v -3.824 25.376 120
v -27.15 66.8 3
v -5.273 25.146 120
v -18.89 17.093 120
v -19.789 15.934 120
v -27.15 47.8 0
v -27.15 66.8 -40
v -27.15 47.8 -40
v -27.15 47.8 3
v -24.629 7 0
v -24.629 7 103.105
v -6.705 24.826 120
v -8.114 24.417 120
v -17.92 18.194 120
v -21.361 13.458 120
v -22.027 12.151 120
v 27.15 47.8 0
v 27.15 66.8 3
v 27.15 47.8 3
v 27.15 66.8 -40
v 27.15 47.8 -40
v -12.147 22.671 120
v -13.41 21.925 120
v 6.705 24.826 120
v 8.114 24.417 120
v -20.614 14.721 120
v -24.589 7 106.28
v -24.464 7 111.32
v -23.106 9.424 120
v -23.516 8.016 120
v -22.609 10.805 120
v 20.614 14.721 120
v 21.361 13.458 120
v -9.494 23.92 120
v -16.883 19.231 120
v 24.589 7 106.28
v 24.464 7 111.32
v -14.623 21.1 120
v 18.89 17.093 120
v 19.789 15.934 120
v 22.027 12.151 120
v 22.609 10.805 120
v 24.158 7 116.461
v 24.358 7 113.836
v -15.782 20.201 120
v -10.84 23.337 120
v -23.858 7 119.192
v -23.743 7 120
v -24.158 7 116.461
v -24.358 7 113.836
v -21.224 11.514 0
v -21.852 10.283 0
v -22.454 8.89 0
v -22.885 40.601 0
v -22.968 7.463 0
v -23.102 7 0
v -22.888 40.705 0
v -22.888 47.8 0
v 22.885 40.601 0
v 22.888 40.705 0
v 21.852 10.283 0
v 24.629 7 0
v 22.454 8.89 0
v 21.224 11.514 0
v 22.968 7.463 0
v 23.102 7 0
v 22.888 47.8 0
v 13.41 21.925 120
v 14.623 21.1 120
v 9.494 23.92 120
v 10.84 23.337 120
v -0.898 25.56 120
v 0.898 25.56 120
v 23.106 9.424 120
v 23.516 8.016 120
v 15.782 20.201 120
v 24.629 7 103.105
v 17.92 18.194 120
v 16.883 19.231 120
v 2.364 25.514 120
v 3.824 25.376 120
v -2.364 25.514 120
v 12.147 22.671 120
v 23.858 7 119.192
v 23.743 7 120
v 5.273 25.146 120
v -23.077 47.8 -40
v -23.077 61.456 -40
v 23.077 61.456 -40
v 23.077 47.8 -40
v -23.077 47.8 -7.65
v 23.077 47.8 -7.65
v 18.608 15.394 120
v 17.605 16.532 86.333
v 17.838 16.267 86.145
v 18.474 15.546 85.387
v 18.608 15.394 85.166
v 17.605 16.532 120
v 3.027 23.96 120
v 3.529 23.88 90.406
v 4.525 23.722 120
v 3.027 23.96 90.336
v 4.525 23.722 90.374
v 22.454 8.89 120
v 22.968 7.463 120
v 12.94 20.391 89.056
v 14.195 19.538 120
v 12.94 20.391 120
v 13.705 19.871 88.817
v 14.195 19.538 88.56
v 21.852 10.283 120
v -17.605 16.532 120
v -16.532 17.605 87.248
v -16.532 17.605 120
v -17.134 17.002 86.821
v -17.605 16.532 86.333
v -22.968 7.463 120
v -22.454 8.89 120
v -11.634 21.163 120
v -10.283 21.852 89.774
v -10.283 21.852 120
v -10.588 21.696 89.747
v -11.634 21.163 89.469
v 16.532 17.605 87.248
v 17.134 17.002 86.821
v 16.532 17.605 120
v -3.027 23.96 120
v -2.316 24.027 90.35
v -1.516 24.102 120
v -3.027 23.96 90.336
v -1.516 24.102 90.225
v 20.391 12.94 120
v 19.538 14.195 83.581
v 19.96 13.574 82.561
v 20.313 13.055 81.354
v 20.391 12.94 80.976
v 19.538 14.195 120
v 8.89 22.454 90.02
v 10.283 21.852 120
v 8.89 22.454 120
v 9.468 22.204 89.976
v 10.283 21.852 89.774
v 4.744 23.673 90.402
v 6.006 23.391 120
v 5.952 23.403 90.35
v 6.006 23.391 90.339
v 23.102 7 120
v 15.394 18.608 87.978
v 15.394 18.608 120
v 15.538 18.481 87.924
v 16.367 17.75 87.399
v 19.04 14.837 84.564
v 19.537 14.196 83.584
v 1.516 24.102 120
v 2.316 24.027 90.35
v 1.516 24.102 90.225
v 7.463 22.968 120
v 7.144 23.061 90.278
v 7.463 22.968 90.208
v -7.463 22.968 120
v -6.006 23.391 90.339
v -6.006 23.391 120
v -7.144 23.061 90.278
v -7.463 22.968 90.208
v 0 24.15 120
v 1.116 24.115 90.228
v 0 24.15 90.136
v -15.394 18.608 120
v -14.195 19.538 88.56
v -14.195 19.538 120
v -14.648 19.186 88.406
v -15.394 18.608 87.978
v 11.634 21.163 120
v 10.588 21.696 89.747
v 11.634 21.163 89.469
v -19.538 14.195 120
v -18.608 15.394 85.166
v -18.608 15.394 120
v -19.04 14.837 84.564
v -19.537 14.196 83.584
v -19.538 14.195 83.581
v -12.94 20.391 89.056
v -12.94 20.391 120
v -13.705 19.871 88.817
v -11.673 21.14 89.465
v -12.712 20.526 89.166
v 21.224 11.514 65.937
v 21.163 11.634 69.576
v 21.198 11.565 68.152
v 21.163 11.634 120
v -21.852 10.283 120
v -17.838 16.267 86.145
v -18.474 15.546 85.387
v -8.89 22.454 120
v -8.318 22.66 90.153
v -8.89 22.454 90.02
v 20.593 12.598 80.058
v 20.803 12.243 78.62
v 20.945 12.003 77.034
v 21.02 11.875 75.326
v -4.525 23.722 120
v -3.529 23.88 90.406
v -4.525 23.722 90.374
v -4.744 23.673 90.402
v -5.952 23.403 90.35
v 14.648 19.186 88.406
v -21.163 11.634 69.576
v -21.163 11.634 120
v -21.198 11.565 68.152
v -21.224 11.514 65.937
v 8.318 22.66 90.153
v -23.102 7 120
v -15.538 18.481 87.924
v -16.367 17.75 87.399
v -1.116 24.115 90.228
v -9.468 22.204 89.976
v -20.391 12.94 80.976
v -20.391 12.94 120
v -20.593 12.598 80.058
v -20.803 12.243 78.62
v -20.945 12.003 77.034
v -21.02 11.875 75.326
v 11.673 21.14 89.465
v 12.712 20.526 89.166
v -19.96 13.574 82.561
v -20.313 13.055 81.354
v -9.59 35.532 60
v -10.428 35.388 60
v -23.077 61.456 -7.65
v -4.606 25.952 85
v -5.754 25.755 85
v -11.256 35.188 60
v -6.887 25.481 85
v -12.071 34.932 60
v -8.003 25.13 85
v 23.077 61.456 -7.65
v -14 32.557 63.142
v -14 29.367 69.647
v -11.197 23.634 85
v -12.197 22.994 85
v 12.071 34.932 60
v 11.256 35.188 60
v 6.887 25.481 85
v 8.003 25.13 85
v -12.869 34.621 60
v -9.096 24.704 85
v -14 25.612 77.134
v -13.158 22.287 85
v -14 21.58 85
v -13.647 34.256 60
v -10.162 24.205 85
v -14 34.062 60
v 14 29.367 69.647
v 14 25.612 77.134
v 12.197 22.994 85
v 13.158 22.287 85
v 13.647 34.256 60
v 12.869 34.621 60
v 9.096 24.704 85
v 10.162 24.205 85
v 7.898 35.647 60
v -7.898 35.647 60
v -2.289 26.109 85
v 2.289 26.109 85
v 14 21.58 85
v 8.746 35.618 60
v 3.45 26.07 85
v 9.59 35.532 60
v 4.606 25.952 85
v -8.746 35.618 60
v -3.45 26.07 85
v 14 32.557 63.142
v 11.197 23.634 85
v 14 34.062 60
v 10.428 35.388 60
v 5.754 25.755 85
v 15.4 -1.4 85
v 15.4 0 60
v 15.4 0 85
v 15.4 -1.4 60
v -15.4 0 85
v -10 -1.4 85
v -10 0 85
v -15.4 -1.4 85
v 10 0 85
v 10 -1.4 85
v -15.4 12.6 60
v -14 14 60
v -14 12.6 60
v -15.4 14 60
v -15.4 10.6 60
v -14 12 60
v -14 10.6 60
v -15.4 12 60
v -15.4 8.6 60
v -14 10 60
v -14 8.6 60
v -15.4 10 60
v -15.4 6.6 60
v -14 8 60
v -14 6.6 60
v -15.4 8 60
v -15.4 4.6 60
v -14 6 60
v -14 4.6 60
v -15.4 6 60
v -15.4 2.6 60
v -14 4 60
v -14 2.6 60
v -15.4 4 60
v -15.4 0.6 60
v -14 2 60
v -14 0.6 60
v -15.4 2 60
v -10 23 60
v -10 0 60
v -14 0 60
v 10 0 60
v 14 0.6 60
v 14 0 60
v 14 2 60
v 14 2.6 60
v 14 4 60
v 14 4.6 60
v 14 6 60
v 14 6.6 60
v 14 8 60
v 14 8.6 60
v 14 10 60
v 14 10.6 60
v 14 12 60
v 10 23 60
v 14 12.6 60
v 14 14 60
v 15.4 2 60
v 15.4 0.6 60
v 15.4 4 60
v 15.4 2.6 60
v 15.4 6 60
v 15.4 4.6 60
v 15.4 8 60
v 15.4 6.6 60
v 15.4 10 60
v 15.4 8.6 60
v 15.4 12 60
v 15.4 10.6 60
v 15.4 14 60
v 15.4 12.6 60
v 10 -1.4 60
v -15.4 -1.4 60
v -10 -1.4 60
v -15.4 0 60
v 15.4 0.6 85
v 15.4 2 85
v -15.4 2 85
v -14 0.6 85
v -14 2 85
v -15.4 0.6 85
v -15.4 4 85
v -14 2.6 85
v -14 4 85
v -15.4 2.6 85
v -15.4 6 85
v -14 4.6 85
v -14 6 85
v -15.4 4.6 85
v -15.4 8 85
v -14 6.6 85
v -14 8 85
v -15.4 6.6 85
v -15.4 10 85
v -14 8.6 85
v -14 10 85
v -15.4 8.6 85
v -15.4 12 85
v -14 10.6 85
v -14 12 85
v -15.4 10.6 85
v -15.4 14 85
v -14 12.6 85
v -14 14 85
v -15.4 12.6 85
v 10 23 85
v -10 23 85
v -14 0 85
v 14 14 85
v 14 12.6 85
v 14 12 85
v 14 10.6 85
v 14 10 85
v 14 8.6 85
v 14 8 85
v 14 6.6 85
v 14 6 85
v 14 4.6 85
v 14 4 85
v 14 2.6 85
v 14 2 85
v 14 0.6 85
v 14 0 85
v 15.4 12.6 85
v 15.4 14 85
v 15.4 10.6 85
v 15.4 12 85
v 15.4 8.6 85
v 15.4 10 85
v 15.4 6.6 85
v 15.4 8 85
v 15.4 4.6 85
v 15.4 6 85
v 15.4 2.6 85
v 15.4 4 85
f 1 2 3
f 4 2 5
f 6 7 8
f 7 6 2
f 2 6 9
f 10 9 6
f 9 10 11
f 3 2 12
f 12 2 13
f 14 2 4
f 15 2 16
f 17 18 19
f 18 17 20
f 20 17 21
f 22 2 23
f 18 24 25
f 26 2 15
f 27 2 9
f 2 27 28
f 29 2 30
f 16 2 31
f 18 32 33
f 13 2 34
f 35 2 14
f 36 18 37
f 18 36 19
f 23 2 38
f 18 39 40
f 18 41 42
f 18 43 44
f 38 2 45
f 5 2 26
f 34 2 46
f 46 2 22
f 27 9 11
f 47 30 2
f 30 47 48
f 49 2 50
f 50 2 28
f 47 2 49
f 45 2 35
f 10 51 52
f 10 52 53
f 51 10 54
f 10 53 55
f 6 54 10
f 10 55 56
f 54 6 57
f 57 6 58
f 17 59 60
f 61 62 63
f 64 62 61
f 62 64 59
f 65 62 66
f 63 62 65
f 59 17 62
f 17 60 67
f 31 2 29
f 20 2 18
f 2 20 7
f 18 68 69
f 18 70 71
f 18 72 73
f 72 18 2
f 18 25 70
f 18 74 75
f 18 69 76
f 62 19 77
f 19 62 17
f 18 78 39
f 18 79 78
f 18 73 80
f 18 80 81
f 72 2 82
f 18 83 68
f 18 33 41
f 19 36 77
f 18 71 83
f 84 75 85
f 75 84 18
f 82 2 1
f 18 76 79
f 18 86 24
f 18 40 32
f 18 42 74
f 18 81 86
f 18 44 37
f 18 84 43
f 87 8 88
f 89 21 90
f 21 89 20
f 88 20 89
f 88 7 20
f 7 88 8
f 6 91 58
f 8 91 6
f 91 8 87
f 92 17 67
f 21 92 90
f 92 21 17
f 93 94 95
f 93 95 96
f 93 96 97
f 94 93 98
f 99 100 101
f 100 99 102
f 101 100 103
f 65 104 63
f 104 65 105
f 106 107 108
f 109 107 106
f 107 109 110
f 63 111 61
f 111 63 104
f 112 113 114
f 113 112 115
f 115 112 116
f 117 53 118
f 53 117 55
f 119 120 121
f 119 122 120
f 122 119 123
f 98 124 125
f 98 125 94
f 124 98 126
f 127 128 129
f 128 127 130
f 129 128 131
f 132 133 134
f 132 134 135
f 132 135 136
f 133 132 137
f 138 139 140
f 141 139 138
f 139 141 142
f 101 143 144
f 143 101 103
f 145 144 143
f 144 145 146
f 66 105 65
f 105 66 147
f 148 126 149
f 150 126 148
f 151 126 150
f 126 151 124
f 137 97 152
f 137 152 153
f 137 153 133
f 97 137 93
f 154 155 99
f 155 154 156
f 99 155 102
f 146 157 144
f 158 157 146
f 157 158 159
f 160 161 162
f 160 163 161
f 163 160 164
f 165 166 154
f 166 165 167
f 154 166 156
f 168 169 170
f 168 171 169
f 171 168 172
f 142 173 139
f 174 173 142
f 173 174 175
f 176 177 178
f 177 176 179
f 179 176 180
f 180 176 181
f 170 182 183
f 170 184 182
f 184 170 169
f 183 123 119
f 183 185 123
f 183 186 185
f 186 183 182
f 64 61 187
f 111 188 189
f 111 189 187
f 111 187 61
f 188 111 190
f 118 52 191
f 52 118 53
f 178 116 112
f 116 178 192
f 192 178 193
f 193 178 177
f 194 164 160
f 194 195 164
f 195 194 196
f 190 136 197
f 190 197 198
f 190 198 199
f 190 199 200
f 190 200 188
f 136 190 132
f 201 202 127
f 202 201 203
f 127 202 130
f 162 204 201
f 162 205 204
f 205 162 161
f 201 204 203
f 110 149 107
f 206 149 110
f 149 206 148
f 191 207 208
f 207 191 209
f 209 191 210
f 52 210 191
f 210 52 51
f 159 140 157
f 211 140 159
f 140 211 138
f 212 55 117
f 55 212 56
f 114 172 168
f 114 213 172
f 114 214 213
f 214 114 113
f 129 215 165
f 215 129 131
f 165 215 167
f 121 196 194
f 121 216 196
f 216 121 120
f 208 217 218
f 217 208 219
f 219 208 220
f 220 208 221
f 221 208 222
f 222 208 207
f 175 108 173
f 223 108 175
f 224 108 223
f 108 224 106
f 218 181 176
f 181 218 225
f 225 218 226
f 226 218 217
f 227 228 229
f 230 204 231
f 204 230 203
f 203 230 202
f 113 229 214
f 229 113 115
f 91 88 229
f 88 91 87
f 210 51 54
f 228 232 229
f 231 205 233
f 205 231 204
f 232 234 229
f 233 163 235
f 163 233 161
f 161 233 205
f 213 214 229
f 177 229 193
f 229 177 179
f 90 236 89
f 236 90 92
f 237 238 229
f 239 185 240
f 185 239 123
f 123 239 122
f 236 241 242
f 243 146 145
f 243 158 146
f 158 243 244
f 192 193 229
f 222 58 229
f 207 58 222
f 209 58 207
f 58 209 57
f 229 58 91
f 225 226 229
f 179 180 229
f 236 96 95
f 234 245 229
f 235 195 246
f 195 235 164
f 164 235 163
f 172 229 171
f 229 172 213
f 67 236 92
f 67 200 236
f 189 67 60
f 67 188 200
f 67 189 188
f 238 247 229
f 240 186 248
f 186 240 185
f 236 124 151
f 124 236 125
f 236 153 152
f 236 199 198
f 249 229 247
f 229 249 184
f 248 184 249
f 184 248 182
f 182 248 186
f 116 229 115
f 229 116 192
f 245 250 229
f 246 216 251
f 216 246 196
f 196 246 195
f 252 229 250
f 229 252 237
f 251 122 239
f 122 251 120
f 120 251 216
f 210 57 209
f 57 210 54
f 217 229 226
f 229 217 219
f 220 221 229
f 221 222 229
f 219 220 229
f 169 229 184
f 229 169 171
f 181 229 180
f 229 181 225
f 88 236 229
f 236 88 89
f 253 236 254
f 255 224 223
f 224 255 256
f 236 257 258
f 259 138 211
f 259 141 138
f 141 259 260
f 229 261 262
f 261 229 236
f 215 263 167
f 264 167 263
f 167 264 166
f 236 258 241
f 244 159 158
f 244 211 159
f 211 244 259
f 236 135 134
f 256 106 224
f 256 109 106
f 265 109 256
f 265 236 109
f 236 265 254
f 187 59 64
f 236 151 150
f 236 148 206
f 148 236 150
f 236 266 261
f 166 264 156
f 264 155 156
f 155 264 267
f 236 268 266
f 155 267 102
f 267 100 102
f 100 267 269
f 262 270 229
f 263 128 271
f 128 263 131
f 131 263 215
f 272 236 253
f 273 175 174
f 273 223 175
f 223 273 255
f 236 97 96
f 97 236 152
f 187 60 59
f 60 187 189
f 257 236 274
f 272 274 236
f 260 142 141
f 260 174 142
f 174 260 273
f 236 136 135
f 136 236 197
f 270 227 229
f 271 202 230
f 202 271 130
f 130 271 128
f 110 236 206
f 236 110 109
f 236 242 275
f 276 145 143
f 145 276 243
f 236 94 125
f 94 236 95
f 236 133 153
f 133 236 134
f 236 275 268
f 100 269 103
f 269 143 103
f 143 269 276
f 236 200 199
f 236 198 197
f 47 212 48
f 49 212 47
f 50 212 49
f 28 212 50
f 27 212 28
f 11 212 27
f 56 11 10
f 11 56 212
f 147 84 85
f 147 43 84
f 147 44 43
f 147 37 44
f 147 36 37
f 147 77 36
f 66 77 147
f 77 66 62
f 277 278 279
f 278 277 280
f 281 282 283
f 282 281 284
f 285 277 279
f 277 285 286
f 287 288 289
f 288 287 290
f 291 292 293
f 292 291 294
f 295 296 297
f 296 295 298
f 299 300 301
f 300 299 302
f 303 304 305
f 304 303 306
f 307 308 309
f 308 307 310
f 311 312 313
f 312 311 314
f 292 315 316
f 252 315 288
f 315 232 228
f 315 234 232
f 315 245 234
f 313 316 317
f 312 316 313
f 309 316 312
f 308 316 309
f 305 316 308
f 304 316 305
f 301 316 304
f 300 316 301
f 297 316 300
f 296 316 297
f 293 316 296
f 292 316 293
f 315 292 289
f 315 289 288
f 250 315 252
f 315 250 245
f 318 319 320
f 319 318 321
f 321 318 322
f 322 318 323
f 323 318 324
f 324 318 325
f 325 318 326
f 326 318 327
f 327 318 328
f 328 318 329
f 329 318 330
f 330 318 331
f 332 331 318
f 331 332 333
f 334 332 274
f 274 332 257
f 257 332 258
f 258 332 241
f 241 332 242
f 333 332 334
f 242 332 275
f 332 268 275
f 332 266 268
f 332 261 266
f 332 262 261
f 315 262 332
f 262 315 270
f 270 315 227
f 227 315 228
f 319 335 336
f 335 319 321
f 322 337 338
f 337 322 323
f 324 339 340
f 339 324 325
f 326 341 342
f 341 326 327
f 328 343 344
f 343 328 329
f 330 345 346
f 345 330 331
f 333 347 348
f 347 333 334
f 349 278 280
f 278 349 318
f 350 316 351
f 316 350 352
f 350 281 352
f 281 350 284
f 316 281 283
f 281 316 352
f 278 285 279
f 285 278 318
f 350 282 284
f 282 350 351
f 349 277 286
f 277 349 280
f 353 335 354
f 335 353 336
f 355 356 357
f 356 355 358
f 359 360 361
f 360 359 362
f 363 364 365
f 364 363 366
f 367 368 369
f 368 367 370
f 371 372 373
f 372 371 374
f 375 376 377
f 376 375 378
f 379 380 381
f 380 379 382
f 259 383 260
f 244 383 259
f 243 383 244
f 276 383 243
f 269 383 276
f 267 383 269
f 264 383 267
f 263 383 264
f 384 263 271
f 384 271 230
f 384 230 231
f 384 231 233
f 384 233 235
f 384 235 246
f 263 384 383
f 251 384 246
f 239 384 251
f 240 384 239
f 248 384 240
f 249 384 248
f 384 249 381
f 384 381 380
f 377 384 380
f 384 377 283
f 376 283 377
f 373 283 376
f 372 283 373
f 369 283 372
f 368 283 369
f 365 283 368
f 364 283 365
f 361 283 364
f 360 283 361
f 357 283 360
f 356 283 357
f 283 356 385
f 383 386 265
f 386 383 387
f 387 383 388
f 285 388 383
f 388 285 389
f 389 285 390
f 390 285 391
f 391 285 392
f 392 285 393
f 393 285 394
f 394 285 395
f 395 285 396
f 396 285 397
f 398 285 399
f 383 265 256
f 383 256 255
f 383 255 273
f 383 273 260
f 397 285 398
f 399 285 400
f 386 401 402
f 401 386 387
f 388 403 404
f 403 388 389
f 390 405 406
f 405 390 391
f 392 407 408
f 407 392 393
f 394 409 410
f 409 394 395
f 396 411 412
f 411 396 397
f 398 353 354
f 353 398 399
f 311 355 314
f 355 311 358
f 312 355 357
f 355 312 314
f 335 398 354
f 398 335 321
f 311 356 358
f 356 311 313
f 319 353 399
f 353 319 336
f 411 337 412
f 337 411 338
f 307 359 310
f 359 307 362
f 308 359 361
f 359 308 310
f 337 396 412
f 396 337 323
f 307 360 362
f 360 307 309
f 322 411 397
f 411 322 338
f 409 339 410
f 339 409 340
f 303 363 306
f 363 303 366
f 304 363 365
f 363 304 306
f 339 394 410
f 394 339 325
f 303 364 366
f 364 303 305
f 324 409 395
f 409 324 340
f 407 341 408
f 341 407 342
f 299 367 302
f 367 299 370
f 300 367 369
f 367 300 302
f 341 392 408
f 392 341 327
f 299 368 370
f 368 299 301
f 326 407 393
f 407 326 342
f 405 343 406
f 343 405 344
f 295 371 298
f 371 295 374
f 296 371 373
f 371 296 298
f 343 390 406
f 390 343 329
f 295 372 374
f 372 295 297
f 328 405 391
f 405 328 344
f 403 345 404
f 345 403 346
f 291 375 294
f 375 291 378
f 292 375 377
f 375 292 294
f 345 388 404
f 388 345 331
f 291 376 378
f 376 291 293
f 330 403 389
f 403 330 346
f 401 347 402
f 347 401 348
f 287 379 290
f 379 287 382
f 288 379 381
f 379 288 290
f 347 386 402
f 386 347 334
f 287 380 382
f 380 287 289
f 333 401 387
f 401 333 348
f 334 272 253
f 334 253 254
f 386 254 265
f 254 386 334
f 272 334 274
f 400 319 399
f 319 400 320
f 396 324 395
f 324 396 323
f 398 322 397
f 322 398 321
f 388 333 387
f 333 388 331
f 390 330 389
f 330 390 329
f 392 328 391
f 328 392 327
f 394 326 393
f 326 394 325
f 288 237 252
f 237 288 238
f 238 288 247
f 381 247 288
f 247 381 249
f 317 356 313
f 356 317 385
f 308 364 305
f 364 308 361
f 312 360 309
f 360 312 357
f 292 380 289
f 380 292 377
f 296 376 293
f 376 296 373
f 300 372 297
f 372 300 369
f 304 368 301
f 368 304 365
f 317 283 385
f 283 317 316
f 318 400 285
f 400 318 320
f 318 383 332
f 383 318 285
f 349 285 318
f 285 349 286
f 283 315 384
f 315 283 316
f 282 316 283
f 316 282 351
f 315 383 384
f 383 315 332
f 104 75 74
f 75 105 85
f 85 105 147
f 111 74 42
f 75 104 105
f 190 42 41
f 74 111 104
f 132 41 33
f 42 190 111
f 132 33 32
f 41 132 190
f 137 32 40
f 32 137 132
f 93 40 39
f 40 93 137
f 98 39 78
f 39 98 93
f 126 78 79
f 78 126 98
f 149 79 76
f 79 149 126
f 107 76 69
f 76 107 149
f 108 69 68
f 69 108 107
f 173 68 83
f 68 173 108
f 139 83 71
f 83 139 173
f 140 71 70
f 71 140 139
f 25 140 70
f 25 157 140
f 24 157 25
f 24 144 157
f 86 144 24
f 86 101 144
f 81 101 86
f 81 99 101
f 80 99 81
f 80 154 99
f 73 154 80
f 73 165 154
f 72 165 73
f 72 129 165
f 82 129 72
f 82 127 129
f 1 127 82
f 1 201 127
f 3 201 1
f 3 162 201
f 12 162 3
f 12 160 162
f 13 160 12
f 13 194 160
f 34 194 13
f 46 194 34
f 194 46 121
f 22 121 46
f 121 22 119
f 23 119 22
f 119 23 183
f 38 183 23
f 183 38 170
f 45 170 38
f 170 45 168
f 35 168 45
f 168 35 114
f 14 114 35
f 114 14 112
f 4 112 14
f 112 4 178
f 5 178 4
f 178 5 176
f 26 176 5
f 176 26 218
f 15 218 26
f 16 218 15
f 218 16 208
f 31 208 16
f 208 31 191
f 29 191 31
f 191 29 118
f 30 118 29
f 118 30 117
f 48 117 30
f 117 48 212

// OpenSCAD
poleDiameter=48.3; // 1.9"

baseWidth=100.6; // 3.960"
baseToBack=57.3;

centerToBack=poleDiameter/2+baseToBack;

cablePass=19;
cablePassHeight=40;

holeWidth=28; // 1.130"
dooberHeight=25;
heightToHole=60; // guesstimate

snapHeight=1.4; //guesstimate
snapWidth=1.4;

thickness=3;
height=124; // 5.0"

$fn=100;

module solidCover() {
    difference() {

        union() {
            hull() {
                cylinder(r=poleDiameter/2, h=height);
                translate([0,baseToBack,thickness/2])
                cube([poleDiameter+thickness*2, cablePass, thickness], center=true );
            }

            translate([0, baseToBack, -cablePassHeight/2])
            cube([poleDiameter+thickness*2, cablePass, cablePassHeight], center=true);
        }
    
        translate([0,0,-2])
        cylinder(r=poleDiameter/2, h=height*2);
    }
}

module snapDoober() {
    translate([-holeWidth/2, 0, heightToHole])
    difference() {
        union() {
            cube([holeWidth, 40, dooberHeight]);

            translate([0, -snapWidth*2, 0])
            for (i = [0 : 7]) {
                translate([-snapHeight, i *2 + snapWidth , 0])
                cube([holeWidth+snapHeight*2, snapWidth, dooberHeight]);
            }
        }

        translate([4, -2, 0])
        cube([holeWidth-8, 25, dooberHeight+2]);
    }
}

         
module hollowCover() {
    difference() {
        solidCover();
        scale([0.85, 0.92, 0.85]) translate([0, 0, -12]) solidCover();
    }
}


module fullCover() {
    difference() {
        union() {
            difference() {
                hollowCover();
                translate([-450,-13,-450])
                cube([900,20,900]);
            }

            difference() {
                snapDoober();

                for (i = [1 : 5]) {
                    translate([0, i*2, 0]) hollowCover();
                }
            }
        }

        // Take a few mm off the top
        translate([-100,0,120])
        cube([200,200,20]);
    }
}

module testSlice() {
    difference() {
        fullCover();

        translate([-50,-50,5])
        cube([300,200,300]);

        translate([-50,-50,-308])
        cube([300,200,300]);
    }
}

fullCover();
